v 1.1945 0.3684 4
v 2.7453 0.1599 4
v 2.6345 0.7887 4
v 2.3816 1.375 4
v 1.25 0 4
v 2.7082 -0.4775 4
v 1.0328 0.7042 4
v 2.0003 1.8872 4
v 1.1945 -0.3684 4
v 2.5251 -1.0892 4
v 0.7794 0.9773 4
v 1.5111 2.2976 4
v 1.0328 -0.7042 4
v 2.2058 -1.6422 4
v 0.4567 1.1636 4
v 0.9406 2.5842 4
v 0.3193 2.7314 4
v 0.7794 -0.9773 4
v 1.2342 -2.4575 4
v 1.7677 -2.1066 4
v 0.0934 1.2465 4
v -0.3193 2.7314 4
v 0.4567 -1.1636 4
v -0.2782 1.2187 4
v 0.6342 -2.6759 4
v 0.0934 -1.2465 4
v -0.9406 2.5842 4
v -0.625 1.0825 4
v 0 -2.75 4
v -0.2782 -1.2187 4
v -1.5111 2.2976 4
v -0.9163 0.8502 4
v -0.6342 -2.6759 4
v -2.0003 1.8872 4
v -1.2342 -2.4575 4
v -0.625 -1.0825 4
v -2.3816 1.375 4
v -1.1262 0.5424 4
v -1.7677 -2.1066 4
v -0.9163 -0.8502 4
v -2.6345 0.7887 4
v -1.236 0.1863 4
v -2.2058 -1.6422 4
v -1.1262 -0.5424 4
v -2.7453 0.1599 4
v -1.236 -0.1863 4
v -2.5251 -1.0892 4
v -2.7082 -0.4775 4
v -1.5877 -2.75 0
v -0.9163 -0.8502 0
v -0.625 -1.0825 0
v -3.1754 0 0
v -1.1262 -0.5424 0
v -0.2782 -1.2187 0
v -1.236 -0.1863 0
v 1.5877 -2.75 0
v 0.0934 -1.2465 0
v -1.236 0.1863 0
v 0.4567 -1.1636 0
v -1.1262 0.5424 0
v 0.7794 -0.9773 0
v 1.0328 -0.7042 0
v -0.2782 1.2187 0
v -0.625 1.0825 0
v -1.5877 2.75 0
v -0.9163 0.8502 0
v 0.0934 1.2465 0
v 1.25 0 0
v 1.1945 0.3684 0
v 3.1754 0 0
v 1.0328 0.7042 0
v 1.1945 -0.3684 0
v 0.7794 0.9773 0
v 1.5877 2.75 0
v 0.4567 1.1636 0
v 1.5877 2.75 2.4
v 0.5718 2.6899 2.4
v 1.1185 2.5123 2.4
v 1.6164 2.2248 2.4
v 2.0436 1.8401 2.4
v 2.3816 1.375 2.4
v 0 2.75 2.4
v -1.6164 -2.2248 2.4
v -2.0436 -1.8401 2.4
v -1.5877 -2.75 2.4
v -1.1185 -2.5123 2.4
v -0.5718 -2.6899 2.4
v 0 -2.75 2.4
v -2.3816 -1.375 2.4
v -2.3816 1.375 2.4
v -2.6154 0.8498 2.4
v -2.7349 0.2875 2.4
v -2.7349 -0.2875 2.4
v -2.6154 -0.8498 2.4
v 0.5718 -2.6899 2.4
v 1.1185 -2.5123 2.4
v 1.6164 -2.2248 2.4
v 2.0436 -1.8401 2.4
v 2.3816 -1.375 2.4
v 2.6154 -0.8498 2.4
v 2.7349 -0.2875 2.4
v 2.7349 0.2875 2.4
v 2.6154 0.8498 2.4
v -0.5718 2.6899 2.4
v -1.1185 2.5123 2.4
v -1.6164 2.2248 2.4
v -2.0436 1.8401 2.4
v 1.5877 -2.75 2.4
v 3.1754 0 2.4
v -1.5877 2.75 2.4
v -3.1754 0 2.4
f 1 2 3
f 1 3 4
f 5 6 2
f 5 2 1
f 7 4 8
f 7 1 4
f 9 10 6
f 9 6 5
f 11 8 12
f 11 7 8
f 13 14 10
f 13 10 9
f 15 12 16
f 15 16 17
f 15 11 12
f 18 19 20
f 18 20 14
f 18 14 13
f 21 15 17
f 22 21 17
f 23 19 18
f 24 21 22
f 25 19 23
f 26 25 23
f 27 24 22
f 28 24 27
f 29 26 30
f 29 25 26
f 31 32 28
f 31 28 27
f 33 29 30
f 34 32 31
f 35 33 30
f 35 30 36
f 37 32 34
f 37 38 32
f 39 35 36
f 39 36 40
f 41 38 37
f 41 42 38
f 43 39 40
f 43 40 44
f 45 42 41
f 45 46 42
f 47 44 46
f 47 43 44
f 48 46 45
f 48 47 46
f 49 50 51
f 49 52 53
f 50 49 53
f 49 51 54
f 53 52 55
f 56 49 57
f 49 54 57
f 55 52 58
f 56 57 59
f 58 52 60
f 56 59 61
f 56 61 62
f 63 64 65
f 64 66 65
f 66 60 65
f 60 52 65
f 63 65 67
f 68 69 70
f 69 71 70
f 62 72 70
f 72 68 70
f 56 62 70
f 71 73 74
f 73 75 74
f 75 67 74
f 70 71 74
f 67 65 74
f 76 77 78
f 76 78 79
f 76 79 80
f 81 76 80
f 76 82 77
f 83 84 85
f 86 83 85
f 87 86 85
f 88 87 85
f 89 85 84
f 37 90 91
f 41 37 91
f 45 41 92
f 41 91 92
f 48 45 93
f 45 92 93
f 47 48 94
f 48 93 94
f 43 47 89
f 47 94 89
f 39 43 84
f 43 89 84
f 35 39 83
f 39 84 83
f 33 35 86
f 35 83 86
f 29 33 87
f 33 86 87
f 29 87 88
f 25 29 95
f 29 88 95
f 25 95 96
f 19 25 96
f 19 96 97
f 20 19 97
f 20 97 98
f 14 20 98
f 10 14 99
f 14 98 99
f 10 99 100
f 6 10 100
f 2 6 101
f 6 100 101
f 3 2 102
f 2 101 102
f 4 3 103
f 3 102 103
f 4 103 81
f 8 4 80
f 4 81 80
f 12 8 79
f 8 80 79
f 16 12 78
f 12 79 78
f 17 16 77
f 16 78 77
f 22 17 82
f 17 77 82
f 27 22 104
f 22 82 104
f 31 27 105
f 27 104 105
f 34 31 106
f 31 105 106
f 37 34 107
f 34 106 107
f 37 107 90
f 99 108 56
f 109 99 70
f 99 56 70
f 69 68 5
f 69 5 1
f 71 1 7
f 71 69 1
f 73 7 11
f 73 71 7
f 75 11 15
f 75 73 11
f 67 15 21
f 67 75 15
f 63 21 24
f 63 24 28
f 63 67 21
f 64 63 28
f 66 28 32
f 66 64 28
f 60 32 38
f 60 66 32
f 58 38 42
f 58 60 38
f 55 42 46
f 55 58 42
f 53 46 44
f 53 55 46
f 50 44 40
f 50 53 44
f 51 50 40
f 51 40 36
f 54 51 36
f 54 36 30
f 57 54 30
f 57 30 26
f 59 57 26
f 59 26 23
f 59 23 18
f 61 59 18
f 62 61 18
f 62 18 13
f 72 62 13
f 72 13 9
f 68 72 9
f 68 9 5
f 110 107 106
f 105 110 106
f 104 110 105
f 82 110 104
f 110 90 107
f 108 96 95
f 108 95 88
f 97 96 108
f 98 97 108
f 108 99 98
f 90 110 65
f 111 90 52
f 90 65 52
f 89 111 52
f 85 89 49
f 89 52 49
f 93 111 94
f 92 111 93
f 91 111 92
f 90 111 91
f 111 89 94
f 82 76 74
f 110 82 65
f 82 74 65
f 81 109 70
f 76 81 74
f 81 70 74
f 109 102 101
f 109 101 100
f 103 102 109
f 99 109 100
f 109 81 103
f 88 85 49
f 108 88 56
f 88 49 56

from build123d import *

# Parameters (mm, degrees)
ESQUISSE1_R        = 1.25
BOSS_EXTRU_1_DEPTH = 2.4
ESQUISSE2_R        = 2.75
ESQUISSE2_R_2      = 1.25
BOSS_EXTRU_2_DEPTH = 4


with BuildPart() as part:
    # Esquisse1 → Boss.-Extru.1 (new body)
    with BuildSketch(Plane.XY):
        Polygon((3.175426481, 0), (1.58771324, 2.75), (-1.58771324, 2.75), (-3.175426481, 0), (-1.58771324, -2.75), (1.58771324, -2.75), align=None)
        Circle(ESQUISSE1_R, mode=Mode.SUBTRACT)
    extrude(amount=BOSS_EXTRU_1_DEPTH)

    # Esquisse2 → Boss.-Extru.2 (add)
    with BuildSketch(Plane.XY):
        with Locations(Location((0, 0, 0), (0, 0, 150))):
            Circle(ESQUISSE2_R)
        Circle(ESQUISSE2_R_2, mode=Mode.SUBTRACT)
    extrude(amount=BOSS_EXTRU_2_DEPTH)


solid = part.part
